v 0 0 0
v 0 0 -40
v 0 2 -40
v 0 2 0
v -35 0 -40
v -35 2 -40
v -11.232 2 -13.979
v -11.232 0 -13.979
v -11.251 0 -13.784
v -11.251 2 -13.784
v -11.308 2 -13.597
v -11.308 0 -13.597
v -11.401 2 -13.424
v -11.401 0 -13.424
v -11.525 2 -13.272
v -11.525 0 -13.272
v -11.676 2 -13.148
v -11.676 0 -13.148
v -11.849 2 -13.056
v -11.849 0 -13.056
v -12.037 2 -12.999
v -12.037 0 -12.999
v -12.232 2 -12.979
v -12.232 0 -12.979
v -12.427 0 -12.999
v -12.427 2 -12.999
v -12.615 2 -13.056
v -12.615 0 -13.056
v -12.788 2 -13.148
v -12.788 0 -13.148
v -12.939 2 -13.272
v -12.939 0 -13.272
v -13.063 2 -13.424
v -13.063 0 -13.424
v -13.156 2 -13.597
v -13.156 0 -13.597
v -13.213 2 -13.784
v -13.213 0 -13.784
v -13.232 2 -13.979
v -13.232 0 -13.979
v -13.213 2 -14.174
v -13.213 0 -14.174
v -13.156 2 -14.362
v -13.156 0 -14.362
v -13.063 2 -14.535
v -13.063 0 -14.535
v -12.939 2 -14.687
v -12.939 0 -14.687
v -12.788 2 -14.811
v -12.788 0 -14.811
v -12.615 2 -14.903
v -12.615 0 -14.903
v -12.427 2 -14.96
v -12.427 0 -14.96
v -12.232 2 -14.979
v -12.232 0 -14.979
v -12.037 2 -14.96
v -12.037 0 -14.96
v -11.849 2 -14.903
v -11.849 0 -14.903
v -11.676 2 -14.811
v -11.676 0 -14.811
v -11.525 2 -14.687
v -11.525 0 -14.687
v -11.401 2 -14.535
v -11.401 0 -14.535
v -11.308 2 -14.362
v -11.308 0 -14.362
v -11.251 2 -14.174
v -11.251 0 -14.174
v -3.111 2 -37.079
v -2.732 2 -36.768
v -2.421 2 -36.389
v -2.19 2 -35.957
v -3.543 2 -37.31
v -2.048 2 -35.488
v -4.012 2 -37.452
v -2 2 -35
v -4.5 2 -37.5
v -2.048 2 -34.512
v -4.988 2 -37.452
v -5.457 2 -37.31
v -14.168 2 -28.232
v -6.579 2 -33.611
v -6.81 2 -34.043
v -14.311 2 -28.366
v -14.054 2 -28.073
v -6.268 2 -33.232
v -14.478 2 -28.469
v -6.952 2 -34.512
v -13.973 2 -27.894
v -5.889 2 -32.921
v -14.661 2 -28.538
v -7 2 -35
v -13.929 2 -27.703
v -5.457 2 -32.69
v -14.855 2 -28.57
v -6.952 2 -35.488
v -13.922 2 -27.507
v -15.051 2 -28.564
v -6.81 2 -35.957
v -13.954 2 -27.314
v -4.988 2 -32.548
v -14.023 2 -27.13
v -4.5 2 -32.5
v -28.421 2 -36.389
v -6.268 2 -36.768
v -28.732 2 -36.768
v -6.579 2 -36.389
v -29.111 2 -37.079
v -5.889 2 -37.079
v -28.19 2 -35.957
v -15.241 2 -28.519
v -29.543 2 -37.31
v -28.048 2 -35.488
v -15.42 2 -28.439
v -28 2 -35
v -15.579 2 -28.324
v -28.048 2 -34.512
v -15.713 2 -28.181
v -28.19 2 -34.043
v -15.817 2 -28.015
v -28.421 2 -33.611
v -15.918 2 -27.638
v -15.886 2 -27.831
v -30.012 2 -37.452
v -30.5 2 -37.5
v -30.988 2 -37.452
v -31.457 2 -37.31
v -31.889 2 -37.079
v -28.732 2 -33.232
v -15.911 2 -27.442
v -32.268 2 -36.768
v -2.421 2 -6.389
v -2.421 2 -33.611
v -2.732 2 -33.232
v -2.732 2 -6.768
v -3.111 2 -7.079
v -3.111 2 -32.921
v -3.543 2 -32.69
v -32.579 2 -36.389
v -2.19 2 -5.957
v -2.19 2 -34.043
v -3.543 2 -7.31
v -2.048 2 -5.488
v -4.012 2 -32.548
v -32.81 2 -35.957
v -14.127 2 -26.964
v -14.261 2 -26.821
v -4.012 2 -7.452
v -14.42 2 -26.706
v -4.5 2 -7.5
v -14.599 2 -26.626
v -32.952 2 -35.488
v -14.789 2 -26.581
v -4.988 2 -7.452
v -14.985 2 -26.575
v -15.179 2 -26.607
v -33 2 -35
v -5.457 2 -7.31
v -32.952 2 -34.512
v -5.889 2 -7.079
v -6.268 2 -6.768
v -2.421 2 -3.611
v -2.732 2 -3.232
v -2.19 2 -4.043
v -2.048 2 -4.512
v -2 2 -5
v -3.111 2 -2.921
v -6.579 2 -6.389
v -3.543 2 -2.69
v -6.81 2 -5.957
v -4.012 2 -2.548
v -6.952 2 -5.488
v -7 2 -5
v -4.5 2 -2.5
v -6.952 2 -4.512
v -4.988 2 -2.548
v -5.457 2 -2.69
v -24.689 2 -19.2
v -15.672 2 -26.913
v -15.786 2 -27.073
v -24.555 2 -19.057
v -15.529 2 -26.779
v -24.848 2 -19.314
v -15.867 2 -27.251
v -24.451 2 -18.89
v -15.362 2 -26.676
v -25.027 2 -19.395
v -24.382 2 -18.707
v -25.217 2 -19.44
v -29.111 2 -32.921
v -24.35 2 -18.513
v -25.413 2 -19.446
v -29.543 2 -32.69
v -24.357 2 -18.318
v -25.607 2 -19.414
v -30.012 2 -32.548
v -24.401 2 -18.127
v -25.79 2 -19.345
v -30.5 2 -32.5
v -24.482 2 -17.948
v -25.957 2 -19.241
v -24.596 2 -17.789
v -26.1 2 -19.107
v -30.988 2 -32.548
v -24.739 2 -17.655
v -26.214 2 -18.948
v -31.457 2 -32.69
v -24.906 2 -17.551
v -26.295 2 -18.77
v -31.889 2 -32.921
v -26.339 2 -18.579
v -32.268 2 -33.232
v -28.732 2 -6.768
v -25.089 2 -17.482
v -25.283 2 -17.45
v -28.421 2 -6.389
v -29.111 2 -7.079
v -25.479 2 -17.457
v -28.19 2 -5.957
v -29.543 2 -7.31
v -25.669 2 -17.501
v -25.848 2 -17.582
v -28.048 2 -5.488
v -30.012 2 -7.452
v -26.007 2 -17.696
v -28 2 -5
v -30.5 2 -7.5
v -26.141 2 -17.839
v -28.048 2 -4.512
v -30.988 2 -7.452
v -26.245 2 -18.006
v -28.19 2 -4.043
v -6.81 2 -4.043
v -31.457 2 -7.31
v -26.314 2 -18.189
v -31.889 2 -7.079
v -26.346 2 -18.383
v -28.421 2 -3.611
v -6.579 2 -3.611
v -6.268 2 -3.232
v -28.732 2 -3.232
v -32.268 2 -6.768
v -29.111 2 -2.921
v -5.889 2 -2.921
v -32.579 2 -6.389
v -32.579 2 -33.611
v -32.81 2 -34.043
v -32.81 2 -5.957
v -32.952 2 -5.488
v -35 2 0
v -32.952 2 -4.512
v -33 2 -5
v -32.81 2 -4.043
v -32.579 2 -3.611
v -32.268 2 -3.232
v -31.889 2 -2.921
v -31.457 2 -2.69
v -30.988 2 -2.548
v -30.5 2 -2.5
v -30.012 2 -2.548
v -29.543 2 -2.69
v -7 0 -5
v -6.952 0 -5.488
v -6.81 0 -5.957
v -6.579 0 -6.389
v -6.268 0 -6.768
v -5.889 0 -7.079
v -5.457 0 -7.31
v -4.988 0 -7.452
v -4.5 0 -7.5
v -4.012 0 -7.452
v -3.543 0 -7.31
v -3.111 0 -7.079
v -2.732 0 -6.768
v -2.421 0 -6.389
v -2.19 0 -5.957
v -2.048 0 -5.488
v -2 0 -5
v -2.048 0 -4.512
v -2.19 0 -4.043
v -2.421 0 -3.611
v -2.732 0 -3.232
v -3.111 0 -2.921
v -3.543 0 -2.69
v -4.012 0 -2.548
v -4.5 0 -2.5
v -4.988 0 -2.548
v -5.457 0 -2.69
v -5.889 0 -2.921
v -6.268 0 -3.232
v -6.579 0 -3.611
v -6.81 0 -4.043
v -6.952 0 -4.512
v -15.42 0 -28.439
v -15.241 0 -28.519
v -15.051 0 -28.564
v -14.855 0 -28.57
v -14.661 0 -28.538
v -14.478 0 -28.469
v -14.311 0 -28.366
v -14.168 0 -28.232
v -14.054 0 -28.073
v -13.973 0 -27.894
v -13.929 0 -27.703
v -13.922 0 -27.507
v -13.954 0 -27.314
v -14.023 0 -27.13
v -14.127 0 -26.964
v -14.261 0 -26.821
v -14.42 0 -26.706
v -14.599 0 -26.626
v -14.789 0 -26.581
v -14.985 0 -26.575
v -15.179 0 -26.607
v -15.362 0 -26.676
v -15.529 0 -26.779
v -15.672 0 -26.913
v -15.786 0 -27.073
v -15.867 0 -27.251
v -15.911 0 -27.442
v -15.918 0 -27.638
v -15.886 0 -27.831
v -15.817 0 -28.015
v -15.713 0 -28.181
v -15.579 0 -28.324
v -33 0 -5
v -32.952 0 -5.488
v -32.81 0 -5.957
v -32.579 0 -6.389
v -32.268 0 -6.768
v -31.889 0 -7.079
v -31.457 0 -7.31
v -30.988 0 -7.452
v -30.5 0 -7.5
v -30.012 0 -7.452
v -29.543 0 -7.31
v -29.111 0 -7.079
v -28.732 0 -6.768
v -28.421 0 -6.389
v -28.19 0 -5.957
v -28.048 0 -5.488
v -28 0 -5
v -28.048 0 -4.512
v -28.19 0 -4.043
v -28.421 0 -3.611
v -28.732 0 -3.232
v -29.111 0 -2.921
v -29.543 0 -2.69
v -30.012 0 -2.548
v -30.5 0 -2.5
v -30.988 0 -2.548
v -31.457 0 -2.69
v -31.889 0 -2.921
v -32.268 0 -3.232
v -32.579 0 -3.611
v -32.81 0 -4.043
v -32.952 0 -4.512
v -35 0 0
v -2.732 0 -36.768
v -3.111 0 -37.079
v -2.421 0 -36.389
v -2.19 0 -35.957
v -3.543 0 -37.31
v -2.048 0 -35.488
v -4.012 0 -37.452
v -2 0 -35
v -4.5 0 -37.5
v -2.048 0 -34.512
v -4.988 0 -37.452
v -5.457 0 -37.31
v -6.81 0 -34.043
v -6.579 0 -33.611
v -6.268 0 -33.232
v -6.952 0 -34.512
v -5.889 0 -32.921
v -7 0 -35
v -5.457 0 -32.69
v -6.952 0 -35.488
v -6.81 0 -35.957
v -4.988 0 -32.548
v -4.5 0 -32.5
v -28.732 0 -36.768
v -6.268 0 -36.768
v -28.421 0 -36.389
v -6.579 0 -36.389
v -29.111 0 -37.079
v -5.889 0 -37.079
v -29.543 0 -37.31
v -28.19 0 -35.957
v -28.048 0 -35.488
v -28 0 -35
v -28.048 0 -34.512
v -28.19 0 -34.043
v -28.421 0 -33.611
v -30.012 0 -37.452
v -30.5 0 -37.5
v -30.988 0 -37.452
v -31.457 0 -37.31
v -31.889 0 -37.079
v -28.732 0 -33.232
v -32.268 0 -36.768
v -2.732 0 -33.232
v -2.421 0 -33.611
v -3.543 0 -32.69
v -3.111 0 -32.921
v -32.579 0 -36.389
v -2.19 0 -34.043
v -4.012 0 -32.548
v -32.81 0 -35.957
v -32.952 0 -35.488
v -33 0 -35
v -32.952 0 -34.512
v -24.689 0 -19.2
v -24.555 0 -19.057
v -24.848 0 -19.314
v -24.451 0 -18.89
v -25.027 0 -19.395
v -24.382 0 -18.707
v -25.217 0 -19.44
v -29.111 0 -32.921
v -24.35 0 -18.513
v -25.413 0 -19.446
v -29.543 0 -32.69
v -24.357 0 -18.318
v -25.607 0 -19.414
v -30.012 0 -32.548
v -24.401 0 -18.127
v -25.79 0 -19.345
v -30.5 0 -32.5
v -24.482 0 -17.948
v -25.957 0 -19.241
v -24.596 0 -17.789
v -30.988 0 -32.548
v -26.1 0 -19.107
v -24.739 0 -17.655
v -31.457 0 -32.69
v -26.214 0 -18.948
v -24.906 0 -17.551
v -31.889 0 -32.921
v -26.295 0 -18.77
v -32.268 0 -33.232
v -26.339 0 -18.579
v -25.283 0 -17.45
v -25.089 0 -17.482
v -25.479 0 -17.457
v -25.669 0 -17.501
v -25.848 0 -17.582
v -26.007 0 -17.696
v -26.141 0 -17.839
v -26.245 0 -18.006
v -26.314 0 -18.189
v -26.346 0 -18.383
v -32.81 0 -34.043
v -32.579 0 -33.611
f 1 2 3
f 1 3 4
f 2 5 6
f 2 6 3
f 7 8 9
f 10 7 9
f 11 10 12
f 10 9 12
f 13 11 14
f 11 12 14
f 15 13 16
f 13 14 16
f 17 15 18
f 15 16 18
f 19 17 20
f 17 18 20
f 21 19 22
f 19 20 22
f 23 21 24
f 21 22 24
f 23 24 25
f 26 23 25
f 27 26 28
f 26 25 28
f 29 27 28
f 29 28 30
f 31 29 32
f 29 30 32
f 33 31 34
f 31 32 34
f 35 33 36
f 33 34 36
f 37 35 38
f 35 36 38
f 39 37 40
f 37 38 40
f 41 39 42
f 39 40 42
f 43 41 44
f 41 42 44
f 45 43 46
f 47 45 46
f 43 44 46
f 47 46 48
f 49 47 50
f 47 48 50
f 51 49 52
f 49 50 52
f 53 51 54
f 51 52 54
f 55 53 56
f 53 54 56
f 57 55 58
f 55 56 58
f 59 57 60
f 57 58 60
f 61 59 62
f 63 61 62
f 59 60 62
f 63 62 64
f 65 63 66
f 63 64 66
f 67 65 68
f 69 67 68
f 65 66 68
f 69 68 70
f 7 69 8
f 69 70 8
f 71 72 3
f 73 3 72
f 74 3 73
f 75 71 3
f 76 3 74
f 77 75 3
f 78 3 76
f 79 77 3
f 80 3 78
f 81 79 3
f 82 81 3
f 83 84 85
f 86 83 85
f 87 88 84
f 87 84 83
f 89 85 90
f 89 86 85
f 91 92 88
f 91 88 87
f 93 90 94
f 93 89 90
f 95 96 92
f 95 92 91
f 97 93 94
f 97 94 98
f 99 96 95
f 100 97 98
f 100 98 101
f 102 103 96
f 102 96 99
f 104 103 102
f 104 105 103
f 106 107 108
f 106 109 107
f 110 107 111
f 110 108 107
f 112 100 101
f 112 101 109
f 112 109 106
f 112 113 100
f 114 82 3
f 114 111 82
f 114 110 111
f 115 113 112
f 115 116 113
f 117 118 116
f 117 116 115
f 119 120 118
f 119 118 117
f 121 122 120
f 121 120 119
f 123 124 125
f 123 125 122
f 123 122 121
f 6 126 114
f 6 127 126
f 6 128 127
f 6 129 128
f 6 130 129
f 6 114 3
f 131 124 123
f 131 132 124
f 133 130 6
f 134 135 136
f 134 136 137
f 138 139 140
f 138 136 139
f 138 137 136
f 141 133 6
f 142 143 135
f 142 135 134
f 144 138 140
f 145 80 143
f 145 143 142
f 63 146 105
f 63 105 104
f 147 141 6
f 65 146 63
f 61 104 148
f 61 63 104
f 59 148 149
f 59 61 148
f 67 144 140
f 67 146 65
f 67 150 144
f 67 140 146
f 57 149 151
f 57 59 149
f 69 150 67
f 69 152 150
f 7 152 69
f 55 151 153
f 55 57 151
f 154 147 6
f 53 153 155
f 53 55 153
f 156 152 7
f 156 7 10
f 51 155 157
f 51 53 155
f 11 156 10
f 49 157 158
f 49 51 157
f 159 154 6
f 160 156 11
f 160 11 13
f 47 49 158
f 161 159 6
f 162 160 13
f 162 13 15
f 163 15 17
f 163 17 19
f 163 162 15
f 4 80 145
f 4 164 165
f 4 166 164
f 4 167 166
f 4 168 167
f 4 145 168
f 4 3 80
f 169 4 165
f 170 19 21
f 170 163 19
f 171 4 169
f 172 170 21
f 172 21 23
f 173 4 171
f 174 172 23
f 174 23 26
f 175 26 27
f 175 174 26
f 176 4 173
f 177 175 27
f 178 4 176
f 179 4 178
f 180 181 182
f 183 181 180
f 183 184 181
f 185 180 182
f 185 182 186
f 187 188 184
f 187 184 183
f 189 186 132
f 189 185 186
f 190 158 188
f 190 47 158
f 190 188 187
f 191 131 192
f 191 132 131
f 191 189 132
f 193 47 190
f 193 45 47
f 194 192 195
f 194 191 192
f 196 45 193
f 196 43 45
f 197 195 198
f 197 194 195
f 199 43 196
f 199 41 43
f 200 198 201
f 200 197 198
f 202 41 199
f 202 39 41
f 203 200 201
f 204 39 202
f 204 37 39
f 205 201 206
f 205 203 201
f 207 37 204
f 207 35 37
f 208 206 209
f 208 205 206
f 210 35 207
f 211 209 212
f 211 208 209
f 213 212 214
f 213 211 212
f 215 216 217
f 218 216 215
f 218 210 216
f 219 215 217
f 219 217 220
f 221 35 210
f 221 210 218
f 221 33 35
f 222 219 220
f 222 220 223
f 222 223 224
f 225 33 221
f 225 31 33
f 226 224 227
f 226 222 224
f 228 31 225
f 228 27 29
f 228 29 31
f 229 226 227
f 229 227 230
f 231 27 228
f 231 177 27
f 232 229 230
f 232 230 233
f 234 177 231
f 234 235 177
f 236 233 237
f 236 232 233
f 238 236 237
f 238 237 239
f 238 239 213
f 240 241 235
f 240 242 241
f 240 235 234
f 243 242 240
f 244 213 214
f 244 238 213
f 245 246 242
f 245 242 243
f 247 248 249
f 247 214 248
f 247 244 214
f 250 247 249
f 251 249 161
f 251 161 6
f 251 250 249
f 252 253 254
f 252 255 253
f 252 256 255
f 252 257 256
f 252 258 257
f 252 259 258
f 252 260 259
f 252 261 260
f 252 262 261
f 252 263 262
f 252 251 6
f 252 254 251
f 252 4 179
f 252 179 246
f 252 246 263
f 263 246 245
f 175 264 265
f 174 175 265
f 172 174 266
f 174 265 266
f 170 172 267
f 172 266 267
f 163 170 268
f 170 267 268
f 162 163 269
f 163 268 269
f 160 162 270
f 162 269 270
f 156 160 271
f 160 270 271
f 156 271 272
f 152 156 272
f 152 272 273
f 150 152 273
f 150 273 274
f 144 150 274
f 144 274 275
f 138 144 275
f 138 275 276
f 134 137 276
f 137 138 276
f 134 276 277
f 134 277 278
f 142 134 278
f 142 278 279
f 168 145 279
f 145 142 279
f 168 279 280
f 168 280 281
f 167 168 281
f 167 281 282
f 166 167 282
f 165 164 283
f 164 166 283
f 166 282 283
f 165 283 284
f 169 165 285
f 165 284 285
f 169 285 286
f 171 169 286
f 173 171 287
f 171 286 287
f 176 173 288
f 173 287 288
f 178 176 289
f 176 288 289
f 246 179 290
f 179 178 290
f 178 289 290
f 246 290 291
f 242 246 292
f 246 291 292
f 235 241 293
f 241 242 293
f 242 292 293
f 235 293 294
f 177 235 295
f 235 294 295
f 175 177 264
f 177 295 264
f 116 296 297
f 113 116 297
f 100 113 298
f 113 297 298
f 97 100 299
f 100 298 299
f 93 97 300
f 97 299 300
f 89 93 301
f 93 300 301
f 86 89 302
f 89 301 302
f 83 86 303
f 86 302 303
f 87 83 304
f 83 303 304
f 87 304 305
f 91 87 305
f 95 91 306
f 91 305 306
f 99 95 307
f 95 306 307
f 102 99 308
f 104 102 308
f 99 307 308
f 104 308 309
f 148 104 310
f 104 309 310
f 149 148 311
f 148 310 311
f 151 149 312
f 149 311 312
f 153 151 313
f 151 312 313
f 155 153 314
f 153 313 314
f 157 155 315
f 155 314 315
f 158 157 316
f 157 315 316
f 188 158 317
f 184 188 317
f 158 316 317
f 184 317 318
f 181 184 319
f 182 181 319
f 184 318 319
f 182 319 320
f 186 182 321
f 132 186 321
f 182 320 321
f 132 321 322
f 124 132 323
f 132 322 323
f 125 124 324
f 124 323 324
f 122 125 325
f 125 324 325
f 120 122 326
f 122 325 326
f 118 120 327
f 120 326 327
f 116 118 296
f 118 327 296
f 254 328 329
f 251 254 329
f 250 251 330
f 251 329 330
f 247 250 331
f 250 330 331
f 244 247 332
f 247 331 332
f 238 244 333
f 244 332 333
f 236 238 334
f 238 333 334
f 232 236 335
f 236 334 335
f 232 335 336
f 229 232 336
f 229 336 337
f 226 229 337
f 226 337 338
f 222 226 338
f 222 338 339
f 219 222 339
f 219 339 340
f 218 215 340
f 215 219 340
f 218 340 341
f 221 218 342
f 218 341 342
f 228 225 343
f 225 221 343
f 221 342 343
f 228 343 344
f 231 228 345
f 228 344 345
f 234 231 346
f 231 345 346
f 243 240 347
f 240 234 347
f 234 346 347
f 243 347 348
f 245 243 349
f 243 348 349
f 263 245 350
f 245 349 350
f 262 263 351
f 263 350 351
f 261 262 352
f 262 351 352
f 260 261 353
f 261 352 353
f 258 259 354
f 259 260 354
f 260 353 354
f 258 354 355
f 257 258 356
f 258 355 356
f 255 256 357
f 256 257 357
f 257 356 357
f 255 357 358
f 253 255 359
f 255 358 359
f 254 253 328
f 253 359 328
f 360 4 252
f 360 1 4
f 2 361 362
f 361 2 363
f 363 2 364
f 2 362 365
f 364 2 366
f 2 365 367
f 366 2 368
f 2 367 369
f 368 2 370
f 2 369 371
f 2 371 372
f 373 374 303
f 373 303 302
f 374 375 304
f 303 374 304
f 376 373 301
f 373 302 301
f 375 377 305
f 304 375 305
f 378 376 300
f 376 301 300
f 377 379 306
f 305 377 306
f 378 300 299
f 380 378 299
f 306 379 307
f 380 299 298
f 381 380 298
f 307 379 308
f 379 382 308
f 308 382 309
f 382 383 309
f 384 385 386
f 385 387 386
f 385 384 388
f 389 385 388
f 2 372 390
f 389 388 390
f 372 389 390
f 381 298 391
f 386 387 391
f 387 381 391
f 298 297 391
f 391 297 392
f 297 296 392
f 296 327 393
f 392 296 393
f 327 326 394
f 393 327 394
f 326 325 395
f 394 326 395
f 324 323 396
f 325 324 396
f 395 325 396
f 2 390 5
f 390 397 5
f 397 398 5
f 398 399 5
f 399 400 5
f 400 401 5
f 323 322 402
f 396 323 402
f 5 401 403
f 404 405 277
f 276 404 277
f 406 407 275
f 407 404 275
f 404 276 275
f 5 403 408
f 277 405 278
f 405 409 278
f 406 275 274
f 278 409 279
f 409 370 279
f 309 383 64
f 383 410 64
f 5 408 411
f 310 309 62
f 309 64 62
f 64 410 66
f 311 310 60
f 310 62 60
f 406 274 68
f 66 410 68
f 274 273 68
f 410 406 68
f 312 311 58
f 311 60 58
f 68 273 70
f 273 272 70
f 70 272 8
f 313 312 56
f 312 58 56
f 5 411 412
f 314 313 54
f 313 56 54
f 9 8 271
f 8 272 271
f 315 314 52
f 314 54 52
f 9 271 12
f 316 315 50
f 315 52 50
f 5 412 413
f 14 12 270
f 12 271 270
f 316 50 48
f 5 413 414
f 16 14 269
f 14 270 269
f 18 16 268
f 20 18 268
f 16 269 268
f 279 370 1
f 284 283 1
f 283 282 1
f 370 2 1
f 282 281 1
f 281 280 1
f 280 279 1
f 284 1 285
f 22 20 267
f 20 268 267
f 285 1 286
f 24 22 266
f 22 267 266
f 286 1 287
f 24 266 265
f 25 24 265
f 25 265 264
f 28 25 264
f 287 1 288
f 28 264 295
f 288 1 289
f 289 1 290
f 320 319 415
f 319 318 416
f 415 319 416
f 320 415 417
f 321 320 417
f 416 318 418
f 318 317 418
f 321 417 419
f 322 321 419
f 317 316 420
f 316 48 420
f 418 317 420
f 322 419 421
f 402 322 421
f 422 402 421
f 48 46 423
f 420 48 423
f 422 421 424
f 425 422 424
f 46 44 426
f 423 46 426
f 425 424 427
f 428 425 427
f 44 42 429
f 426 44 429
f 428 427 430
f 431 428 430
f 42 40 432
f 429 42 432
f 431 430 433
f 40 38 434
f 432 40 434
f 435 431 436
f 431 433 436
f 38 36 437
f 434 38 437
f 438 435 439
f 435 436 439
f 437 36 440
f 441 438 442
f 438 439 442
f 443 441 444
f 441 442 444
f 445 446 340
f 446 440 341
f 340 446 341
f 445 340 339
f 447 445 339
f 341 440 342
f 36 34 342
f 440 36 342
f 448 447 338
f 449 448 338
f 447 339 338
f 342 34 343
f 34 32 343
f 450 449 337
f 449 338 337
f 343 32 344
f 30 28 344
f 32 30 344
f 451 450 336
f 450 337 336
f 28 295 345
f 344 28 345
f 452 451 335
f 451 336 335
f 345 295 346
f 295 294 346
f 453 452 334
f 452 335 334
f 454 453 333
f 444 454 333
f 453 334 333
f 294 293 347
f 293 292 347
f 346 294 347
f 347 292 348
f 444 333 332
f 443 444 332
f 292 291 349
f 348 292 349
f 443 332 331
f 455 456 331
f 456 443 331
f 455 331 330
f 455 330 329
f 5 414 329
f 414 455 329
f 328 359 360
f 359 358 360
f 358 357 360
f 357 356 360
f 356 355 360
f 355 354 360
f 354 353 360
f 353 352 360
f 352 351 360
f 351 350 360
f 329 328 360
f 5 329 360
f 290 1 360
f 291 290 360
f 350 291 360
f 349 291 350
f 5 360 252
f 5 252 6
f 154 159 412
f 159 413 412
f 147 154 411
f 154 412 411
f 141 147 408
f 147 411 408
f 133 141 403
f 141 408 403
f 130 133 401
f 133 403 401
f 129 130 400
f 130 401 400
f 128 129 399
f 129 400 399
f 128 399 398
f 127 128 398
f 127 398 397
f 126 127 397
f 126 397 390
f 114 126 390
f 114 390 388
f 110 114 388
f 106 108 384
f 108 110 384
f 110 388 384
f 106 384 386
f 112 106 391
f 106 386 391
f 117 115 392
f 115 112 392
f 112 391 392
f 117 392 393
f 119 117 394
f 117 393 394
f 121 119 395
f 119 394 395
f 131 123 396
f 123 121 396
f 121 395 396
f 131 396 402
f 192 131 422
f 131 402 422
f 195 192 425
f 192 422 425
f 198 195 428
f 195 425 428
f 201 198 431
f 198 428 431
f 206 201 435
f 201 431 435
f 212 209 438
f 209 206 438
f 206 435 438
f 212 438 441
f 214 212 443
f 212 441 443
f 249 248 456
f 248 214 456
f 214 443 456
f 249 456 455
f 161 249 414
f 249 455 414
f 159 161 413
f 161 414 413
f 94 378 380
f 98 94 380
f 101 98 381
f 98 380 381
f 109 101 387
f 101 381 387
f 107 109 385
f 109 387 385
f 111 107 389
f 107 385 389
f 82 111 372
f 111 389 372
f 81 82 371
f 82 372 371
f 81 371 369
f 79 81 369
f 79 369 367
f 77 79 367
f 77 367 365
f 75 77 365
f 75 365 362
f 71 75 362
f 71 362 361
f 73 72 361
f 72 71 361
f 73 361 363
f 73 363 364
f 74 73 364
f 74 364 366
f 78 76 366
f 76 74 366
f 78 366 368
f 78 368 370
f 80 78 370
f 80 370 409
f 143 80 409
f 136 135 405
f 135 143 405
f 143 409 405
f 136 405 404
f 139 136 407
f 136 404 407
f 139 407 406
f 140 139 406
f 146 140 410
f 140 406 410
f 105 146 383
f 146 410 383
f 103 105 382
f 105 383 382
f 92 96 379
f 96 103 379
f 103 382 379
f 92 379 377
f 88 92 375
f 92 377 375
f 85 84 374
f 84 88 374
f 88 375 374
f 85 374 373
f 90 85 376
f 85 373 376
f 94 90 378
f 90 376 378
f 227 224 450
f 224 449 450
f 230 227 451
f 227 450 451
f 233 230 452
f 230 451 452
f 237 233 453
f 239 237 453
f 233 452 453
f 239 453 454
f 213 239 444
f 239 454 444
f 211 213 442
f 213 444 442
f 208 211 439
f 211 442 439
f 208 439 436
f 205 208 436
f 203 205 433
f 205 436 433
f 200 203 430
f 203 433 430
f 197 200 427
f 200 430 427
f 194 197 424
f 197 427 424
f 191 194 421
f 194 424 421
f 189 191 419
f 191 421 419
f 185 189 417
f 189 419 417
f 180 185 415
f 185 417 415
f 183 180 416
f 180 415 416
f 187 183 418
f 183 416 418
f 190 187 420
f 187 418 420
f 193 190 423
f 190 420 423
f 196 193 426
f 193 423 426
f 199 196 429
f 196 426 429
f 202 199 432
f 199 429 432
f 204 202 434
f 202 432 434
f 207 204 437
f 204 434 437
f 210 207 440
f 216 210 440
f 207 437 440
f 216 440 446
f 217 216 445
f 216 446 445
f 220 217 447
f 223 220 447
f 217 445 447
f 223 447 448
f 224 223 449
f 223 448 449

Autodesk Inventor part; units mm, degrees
ref_plane "YZ Plane" through (0, 0, 0) normal (1, 0, 0) x (0, 1, 0)
ref_plane "XZ Plane" through (0, 0, 0) normal (0, 1, 0) x (-1, 0, 0)
ref_plane "XY Plane" through (0, 0, 0) normal (0, 0, 1) x (1, 0, 0)
sketch "Sketch1" plane through (0, 0, 0) normal (0, 1, 0) x (-1, 0, 0)
  line L0 (0, 0) -> (35, 0)
  line L1 (35, 0) -> (35, -40)
  line L2 (35, -40) -> (0, -40)
  line L3 (0, -40) -> (0, 0)
  line L4 (35, -40) -> (0, 0) construction
  line L5 (35, 0) -> (0, -40) construction
  line L6 (4.5, -5) -> (30.5, -5) construction
  line L7 (30.5, -5) -> (30.5, -35) construction
  line L8 (30.5, -35) -> (4.5, -35) construction
  line L9 (4.5, -35) -> (4.5, -5) construction
  line L10 (4.5, -5) -> (30.5, -35) construction
  line L11 (30.5, -5) -> (4.5, -35) construction
  circle A0 centre (30.5, -5) radius 2.5
  circle A1 centre (30.5, -35) radius 2.5
  circle A2 centre (4.5, -35) radius 2.5
  circle A3 centre (4.5, -5) radius 2.5
  point P0 (17.5, -20)
  dimension "d0" = 35
  dimension "d1" = 40
  dimension "d2" = 26
  dimension "d3" = 30
  dimension "d4" = 5
extrude "Extrusion1" add sketch "Sketch1" along normal blind 2
sketch "Sketch3" plane through (0, 0, 0) normal (0, -1, 0) x (1, 0, 0)
  line L0 (-35, 0) -> (0, -40) construction
  line L1 (0, 0) -> (-35, -40) construction
  circle A0 centre (-12.232, -13.9794) radius 1
  point P0 (-17.5, -20)
  point P1 (-17.5, -20)
  dimension "d19" = 2
  dimension "d20" = 8
extrude "Extrusion2" cut sketch "Sketch3" against normal blind 10
pattern_circular "Circular Pattern1" count 3 over 360 about axis through (-17.5, 0, -20) along (0, -1, 0) of "Extrusion2"
properties part number "carbon_bump_gimbal"
